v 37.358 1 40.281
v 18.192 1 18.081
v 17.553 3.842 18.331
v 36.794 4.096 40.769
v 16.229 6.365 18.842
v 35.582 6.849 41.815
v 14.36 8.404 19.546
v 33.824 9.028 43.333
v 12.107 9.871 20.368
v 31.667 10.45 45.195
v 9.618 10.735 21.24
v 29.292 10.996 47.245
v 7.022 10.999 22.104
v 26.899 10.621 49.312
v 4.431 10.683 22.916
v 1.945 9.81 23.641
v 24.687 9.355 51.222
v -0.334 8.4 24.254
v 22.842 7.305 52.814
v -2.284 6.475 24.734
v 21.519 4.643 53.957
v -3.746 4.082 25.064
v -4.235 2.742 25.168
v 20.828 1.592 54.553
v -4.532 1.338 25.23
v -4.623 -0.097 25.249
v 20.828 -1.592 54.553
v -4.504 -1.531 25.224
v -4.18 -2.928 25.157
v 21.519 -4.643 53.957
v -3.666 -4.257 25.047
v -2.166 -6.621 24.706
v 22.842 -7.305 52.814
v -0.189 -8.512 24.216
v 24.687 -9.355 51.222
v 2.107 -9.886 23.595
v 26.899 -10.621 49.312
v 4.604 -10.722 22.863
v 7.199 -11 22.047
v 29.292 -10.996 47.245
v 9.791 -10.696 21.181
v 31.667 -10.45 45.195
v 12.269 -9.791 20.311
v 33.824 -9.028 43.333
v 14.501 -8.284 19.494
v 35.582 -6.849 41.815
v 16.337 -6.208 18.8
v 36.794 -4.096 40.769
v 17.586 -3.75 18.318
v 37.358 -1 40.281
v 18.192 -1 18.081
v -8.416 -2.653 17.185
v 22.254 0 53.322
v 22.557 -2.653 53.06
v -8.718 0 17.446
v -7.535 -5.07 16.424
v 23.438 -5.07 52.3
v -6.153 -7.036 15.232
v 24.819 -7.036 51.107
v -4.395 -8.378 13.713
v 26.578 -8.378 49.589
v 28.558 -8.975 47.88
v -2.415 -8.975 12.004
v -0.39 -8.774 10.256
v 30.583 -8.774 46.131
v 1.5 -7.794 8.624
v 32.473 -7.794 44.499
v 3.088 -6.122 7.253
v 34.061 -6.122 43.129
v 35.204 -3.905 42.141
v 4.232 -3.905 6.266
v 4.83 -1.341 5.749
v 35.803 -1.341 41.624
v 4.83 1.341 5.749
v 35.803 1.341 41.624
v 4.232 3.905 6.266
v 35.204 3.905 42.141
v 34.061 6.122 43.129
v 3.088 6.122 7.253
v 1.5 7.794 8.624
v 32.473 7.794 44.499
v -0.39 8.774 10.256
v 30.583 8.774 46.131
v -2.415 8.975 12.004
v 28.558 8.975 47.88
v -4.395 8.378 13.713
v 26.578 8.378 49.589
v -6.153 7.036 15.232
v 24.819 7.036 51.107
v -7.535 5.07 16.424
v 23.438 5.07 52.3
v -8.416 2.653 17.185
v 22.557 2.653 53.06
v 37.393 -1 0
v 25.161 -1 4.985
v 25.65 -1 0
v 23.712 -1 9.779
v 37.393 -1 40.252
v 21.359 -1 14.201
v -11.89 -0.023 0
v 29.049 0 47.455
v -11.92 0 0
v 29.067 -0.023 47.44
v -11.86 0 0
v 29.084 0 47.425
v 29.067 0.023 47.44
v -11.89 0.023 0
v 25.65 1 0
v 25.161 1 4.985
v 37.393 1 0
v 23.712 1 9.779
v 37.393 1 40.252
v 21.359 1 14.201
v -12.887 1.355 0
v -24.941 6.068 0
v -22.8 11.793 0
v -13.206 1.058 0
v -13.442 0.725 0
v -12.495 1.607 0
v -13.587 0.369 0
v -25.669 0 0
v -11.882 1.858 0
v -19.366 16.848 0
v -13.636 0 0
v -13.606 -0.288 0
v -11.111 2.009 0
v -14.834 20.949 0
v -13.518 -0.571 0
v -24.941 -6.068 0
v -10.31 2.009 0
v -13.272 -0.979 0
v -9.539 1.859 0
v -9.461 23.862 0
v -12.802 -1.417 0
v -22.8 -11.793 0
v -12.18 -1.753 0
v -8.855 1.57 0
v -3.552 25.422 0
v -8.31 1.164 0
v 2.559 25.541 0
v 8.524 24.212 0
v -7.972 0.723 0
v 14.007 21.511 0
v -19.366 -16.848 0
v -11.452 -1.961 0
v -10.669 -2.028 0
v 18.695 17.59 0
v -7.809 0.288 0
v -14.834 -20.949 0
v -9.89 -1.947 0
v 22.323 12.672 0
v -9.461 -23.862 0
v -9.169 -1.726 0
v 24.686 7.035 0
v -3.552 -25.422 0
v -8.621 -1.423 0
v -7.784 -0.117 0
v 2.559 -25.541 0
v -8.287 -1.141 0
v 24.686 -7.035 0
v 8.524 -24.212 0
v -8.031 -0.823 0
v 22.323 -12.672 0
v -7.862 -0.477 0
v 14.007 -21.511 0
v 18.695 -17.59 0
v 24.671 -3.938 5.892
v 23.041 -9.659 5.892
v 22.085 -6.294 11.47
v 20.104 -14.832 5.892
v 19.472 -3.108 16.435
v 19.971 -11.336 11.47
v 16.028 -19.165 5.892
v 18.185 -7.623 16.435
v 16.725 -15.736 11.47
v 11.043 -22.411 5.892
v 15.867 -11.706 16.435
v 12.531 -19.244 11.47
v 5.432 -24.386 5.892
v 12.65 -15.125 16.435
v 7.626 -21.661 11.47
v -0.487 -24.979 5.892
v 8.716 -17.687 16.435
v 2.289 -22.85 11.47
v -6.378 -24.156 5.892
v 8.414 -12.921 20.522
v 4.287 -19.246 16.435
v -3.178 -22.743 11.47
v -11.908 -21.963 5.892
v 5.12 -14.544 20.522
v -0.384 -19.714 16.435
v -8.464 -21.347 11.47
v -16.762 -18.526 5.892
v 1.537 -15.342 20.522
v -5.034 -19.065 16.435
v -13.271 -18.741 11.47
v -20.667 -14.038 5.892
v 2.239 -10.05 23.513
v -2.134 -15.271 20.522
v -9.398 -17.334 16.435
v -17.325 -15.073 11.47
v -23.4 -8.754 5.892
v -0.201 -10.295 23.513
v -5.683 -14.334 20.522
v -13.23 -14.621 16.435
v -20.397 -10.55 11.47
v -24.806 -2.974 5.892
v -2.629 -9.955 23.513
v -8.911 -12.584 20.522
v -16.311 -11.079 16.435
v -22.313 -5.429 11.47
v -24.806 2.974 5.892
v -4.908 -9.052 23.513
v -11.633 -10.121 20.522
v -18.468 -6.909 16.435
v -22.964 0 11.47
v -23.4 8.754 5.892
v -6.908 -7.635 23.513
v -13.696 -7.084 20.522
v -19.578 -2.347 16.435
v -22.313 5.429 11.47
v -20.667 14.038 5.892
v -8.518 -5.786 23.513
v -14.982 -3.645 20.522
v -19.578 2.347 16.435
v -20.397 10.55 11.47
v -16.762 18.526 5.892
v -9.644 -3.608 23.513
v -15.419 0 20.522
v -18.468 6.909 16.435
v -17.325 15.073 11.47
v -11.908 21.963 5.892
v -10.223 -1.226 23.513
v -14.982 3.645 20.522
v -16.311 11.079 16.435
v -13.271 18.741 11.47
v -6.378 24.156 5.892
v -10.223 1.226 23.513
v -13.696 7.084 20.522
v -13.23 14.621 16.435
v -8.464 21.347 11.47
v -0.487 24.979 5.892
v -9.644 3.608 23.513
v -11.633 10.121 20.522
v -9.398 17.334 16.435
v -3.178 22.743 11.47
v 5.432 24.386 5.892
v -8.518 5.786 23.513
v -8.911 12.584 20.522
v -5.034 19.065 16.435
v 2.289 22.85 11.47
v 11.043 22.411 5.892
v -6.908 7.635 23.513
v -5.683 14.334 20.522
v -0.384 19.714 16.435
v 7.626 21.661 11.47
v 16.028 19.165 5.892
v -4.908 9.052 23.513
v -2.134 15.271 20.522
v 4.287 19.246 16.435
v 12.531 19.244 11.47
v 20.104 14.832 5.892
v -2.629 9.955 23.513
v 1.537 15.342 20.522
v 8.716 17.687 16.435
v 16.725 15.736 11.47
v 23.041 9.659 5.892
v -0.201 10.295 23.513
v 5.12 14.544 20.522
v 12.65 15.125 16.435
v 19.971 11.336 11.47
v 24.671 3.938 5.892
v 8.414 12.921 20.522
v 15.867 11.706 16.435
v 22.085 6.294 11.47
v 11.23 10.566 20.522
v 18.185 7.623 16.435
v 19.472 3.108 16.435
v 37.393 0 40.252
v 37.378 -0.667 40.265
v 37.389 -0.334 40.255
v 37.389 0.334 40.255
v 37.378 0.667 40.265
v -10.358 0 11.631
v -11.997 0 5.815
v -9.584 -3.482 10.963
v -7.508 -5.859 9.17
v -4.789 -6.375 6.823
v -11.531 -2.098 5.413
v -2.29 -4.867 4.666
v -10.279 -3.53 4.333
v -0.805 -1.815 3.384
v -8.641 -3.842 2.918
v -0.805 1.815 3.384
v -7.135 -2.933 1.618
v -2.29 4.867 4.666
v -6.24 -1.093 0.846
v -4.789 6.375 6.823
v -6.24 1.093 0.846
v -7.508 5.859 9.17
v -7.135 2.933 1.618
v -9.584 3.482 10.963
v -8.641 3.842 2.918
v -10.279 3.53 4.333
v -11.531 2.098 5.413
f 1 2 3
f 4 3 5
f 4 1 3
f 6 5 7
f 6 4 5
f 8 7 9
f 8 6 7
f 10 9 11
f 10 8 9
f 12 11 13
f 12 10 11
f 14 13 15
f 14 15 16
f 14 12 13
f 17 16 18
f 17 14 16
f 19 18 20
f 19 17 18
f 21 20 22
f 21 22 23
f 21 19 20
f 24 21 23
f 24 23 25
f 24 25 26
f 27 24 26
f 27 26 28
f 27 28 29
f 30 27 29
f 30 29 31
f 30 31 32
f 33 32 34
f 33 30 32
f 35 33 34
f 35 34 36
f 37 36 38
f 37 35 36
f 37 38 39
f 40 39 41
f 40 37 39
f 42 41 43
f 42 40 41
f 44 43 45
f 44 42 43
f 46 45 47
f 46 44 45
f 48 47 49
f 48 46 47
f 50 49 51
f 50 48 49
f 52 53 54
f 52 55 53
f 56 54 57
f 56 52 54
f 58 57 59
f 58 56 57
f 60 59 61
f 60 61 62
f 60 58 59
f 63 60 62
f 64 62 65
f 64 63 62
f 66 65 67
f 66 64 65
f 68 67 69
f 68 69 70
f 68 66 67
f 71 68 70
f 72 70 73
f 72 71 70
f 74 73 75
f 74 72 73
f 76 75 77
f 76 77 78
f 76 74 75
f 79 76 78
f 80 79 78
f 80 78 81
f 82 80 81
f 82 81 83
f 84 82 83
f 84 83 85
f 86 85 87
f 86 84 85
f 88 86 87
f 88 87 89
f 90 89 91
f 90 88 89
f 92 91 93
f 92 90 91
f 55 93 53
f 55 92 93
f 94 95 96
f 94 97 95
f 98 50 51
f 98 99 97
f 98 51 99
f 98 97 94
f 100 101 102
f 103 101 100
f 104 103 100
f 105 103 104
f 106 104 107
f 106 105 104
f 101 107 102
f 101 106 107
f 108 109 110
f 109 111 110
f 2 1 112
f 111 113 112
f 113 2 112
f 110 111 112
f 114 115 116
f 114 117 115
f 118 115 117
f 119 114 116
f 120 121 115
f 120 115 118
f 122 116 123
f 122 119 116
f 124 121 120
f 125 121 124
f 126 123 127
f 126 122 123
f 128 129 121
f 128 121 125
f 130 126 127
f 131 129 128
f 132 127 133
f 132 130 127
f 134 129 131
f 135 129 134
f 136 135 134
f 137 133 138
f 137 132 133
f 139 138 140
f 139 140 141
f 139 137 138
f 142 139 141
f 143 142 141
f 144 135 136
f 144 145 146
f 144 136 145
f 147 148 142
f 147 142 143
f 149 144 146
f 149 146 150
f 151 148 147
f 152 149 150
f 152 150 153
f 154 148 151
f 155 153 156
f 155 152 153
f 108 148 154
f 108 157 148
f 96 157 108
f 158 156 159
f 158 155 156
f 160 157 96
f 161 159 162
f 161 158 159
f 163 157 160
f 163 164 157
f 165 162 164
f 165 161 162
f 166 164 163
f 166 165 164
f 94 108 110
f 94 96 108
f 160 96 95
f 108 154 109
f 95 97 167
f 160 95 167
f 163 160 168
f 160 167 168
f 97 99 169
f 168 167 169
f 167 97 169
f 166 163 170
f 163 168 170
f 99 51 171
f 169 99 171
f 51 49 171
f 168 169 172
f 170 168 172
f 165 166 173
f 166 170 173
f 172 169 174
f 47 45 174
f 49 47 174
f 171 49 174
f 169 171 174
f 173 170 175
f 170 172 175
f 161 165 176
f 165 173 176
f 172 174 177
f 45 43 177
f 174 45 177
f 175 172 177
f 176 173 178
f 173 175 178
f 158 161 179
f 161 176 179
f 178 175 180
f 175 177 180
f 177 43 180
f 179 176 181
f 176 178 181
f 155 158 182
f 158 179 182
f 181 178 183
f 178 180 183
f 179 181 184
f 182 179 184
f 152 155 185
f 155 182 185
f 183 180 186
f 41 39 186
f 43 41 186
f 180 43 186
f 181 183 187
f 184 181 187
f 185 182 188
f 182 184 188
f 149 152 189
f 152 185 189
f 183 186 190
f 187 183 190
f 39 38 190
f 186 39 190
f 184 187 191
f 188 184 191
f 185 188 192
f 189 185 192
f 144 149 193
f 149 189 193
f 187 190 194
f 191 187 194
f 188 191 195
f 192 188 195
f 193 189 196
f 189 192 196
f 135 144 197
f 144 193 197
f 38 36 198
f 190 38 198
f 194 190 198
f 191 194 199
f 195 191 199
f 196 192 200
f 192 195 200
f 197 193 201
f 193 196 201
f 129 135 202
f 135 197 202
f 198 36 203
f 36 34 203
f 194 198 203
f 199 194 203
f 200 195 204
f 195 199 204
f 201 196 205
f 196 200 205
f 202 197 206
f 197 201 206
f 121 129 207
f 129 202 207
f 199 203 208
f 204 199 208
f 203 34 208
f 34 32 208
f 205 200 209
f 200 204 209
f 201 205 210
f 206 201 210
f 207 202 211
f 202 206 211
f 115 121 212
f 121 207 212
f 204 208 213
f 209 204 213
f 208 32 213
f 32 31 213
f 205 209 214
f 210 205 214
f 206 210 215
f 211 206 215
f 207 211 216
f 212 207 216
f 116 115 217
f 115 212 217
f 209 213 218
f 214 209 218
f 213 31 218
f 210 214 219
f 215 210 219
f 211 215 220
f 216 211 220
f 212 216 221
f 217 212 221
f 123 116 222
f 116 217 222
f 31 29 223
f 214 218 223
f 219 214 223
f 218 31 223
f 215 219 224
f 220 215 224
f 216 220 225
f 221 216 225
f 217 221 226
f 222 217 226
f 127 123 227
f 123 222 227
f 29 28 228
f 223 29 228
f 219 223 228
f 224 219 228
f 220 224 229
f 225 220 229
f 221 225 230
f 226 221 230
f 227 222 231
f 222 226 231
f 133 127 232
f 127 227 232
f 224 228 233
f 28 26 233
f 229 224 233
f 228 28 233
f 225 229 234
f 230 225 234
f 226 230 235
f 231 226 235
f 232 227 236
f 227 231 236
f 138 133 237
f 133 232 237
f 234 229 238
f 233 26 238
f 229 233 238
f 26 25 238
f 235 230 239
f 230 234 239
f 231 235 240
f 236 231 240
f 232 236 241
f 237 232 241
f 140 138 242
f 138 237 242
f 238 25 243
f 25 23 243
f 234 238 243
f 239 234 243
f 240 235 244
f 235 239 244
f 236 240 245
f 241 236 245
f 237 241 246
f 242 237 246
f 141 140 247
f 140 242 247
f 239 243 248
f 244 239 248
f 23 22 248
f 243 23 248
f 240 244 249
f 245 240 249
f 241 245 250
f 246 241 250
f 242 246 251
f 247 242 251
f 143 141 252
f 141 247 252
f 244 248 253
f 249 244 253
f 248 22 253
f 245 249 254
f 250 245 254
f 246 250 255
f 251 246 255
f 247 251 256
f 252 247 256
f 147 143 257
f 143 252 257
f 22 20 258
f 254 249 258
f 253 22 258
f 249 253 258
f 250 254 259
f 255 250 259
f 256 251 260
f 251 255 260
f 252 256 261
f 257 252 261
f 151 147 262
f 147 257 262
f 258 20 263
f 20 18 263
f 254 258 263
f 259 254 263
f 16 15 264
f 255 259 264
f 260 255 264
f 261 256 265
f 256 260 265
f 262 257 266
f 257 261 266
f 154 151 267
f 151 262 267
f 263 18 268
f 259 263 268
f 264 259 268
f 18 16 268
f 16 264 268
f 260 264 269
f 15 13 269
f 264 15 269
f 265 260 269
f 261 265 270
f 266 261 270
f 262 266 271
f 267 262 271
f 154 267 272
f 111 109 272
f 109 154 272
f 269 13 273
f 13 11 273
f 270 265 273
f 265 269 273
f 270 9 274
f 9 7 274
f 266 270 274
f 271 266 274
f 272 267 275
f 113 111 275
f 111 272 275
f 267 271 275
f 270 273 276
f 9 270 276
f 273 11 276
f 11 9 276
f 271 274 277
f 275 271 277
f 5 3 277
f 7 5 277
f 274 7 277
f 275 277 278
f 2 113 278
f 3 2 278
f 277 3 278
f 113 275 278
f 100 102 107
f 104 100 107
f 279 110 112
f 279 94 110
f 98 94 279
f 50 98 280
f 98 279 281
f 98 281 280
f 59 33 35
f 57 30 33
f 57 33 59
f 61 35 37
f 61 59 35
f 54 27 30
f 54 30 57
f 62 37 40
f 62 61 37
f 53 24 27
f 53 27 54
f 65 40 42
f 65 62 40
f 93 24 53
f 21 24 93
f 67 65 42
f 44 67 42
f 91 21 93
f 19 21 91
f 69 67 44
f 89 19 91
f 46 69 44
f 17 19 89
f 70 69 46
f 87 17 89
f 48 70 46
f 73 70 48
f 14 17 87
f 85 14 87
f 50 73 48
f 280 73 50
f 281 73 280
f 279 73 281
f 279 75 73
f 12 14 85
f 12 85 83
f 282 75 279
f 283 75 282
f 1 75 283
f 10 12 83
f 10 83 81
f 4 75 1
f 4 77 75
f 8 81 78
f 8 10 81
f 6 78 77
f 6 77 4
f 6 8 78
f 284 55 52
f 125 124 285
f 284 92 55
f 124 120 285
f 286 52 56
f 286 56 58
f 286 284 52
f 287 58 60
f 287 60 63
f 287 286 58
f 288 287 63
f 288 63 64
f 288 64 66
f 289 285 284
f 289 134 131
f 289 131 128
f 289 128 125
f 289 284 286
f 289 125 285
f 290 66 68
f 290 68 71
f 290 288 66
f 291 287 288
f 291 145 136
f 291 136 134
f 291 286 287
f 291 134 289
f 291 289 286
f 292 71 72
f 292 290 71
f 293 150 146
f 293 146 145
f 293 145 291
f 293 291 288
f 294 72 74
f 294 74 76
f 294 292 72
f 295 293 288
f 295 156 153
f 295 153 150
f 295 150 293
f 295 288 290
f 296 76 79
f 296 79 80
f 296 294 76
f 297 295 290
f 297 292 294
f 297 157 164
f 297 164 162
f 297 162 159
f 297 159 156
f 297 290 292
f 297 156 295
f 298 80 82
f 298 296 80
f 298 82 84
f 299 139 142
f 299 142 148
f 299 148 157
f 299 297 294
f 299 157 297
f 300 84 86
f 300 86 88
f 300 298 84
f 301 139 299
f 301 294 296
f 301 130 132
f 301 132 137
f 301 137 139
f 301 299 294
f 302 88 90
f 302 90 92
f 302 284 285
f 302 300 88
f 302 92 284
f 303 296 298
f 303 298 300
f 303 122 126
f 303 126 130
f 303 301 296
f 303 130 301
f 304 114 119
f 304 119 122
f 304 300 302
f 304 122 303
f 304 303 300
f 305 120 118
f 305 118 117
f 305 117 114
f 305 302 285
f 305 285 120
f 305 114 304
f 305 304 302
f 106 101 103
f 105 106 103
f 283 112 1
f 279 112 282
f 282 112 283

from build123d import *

# Parameters (mm, degrees)
F5_DEPTH = 1


with BuildPart() as f1:
    # F0 (on Front) → F1 (revolve)
    with BuildSketch(Plane.XZ):
        Polygon((-5.6840596146, 7.1883836194), (2.6422325338, 0), (37.392967316, 40.2517151959), (29.0666751676, 47.4400988153), align=None)
    revolve(axis=Axis((11.6913077765, 0, 27.3142412174), (0.6534894199, 0, 0.7569356499)))

    # F2 (on Front) → F3 (revolve)
    with BuildSketch(Plane.XZ):
        with BuildLine():
            ThreePointArc((25.6690302655, 0), (18.1507453672, 18.1507453672), (0, 25.6690302655))
            Line((0, 25.6690302655), (0, 0))
            Line((0, 0), (25.6690302655, 0))
        make_face()
    revolve(axis=Axis((0, 0, 12.8345151327), (0, 0, -1)))

    # F4 (on Front) → F5 (join, symmetric)
    with BuildSketch(Plane.XZ):
        Polygon((37.392967316, 0), (37.392967316, 40.2517151959), (29.0666751676, 47.4400988153), (6.9415707712, 21.8126291683), (6.9415707712, 0), (25.6690302655, 0), align=None)
    extrude(amount=F5_DEPTH, both=True)

    # F6 (on Front) → F7 (revolve, cut)
    with BuildSketch(Plane.XZ):
        Polygon((-14.4681027808, -2.9513076979), (29.0494363935, 47.454981661), (22.254254319, 53.3215035948), (-8.7182755037, 17.4460765821), align=None)
    revolve(axis=Axis((11.6913077765, 0, 27.3142412174), (0.6534894199, 0, 0.7569356499)), mode=Mode.SUBTRACT)


solid = f1.part
